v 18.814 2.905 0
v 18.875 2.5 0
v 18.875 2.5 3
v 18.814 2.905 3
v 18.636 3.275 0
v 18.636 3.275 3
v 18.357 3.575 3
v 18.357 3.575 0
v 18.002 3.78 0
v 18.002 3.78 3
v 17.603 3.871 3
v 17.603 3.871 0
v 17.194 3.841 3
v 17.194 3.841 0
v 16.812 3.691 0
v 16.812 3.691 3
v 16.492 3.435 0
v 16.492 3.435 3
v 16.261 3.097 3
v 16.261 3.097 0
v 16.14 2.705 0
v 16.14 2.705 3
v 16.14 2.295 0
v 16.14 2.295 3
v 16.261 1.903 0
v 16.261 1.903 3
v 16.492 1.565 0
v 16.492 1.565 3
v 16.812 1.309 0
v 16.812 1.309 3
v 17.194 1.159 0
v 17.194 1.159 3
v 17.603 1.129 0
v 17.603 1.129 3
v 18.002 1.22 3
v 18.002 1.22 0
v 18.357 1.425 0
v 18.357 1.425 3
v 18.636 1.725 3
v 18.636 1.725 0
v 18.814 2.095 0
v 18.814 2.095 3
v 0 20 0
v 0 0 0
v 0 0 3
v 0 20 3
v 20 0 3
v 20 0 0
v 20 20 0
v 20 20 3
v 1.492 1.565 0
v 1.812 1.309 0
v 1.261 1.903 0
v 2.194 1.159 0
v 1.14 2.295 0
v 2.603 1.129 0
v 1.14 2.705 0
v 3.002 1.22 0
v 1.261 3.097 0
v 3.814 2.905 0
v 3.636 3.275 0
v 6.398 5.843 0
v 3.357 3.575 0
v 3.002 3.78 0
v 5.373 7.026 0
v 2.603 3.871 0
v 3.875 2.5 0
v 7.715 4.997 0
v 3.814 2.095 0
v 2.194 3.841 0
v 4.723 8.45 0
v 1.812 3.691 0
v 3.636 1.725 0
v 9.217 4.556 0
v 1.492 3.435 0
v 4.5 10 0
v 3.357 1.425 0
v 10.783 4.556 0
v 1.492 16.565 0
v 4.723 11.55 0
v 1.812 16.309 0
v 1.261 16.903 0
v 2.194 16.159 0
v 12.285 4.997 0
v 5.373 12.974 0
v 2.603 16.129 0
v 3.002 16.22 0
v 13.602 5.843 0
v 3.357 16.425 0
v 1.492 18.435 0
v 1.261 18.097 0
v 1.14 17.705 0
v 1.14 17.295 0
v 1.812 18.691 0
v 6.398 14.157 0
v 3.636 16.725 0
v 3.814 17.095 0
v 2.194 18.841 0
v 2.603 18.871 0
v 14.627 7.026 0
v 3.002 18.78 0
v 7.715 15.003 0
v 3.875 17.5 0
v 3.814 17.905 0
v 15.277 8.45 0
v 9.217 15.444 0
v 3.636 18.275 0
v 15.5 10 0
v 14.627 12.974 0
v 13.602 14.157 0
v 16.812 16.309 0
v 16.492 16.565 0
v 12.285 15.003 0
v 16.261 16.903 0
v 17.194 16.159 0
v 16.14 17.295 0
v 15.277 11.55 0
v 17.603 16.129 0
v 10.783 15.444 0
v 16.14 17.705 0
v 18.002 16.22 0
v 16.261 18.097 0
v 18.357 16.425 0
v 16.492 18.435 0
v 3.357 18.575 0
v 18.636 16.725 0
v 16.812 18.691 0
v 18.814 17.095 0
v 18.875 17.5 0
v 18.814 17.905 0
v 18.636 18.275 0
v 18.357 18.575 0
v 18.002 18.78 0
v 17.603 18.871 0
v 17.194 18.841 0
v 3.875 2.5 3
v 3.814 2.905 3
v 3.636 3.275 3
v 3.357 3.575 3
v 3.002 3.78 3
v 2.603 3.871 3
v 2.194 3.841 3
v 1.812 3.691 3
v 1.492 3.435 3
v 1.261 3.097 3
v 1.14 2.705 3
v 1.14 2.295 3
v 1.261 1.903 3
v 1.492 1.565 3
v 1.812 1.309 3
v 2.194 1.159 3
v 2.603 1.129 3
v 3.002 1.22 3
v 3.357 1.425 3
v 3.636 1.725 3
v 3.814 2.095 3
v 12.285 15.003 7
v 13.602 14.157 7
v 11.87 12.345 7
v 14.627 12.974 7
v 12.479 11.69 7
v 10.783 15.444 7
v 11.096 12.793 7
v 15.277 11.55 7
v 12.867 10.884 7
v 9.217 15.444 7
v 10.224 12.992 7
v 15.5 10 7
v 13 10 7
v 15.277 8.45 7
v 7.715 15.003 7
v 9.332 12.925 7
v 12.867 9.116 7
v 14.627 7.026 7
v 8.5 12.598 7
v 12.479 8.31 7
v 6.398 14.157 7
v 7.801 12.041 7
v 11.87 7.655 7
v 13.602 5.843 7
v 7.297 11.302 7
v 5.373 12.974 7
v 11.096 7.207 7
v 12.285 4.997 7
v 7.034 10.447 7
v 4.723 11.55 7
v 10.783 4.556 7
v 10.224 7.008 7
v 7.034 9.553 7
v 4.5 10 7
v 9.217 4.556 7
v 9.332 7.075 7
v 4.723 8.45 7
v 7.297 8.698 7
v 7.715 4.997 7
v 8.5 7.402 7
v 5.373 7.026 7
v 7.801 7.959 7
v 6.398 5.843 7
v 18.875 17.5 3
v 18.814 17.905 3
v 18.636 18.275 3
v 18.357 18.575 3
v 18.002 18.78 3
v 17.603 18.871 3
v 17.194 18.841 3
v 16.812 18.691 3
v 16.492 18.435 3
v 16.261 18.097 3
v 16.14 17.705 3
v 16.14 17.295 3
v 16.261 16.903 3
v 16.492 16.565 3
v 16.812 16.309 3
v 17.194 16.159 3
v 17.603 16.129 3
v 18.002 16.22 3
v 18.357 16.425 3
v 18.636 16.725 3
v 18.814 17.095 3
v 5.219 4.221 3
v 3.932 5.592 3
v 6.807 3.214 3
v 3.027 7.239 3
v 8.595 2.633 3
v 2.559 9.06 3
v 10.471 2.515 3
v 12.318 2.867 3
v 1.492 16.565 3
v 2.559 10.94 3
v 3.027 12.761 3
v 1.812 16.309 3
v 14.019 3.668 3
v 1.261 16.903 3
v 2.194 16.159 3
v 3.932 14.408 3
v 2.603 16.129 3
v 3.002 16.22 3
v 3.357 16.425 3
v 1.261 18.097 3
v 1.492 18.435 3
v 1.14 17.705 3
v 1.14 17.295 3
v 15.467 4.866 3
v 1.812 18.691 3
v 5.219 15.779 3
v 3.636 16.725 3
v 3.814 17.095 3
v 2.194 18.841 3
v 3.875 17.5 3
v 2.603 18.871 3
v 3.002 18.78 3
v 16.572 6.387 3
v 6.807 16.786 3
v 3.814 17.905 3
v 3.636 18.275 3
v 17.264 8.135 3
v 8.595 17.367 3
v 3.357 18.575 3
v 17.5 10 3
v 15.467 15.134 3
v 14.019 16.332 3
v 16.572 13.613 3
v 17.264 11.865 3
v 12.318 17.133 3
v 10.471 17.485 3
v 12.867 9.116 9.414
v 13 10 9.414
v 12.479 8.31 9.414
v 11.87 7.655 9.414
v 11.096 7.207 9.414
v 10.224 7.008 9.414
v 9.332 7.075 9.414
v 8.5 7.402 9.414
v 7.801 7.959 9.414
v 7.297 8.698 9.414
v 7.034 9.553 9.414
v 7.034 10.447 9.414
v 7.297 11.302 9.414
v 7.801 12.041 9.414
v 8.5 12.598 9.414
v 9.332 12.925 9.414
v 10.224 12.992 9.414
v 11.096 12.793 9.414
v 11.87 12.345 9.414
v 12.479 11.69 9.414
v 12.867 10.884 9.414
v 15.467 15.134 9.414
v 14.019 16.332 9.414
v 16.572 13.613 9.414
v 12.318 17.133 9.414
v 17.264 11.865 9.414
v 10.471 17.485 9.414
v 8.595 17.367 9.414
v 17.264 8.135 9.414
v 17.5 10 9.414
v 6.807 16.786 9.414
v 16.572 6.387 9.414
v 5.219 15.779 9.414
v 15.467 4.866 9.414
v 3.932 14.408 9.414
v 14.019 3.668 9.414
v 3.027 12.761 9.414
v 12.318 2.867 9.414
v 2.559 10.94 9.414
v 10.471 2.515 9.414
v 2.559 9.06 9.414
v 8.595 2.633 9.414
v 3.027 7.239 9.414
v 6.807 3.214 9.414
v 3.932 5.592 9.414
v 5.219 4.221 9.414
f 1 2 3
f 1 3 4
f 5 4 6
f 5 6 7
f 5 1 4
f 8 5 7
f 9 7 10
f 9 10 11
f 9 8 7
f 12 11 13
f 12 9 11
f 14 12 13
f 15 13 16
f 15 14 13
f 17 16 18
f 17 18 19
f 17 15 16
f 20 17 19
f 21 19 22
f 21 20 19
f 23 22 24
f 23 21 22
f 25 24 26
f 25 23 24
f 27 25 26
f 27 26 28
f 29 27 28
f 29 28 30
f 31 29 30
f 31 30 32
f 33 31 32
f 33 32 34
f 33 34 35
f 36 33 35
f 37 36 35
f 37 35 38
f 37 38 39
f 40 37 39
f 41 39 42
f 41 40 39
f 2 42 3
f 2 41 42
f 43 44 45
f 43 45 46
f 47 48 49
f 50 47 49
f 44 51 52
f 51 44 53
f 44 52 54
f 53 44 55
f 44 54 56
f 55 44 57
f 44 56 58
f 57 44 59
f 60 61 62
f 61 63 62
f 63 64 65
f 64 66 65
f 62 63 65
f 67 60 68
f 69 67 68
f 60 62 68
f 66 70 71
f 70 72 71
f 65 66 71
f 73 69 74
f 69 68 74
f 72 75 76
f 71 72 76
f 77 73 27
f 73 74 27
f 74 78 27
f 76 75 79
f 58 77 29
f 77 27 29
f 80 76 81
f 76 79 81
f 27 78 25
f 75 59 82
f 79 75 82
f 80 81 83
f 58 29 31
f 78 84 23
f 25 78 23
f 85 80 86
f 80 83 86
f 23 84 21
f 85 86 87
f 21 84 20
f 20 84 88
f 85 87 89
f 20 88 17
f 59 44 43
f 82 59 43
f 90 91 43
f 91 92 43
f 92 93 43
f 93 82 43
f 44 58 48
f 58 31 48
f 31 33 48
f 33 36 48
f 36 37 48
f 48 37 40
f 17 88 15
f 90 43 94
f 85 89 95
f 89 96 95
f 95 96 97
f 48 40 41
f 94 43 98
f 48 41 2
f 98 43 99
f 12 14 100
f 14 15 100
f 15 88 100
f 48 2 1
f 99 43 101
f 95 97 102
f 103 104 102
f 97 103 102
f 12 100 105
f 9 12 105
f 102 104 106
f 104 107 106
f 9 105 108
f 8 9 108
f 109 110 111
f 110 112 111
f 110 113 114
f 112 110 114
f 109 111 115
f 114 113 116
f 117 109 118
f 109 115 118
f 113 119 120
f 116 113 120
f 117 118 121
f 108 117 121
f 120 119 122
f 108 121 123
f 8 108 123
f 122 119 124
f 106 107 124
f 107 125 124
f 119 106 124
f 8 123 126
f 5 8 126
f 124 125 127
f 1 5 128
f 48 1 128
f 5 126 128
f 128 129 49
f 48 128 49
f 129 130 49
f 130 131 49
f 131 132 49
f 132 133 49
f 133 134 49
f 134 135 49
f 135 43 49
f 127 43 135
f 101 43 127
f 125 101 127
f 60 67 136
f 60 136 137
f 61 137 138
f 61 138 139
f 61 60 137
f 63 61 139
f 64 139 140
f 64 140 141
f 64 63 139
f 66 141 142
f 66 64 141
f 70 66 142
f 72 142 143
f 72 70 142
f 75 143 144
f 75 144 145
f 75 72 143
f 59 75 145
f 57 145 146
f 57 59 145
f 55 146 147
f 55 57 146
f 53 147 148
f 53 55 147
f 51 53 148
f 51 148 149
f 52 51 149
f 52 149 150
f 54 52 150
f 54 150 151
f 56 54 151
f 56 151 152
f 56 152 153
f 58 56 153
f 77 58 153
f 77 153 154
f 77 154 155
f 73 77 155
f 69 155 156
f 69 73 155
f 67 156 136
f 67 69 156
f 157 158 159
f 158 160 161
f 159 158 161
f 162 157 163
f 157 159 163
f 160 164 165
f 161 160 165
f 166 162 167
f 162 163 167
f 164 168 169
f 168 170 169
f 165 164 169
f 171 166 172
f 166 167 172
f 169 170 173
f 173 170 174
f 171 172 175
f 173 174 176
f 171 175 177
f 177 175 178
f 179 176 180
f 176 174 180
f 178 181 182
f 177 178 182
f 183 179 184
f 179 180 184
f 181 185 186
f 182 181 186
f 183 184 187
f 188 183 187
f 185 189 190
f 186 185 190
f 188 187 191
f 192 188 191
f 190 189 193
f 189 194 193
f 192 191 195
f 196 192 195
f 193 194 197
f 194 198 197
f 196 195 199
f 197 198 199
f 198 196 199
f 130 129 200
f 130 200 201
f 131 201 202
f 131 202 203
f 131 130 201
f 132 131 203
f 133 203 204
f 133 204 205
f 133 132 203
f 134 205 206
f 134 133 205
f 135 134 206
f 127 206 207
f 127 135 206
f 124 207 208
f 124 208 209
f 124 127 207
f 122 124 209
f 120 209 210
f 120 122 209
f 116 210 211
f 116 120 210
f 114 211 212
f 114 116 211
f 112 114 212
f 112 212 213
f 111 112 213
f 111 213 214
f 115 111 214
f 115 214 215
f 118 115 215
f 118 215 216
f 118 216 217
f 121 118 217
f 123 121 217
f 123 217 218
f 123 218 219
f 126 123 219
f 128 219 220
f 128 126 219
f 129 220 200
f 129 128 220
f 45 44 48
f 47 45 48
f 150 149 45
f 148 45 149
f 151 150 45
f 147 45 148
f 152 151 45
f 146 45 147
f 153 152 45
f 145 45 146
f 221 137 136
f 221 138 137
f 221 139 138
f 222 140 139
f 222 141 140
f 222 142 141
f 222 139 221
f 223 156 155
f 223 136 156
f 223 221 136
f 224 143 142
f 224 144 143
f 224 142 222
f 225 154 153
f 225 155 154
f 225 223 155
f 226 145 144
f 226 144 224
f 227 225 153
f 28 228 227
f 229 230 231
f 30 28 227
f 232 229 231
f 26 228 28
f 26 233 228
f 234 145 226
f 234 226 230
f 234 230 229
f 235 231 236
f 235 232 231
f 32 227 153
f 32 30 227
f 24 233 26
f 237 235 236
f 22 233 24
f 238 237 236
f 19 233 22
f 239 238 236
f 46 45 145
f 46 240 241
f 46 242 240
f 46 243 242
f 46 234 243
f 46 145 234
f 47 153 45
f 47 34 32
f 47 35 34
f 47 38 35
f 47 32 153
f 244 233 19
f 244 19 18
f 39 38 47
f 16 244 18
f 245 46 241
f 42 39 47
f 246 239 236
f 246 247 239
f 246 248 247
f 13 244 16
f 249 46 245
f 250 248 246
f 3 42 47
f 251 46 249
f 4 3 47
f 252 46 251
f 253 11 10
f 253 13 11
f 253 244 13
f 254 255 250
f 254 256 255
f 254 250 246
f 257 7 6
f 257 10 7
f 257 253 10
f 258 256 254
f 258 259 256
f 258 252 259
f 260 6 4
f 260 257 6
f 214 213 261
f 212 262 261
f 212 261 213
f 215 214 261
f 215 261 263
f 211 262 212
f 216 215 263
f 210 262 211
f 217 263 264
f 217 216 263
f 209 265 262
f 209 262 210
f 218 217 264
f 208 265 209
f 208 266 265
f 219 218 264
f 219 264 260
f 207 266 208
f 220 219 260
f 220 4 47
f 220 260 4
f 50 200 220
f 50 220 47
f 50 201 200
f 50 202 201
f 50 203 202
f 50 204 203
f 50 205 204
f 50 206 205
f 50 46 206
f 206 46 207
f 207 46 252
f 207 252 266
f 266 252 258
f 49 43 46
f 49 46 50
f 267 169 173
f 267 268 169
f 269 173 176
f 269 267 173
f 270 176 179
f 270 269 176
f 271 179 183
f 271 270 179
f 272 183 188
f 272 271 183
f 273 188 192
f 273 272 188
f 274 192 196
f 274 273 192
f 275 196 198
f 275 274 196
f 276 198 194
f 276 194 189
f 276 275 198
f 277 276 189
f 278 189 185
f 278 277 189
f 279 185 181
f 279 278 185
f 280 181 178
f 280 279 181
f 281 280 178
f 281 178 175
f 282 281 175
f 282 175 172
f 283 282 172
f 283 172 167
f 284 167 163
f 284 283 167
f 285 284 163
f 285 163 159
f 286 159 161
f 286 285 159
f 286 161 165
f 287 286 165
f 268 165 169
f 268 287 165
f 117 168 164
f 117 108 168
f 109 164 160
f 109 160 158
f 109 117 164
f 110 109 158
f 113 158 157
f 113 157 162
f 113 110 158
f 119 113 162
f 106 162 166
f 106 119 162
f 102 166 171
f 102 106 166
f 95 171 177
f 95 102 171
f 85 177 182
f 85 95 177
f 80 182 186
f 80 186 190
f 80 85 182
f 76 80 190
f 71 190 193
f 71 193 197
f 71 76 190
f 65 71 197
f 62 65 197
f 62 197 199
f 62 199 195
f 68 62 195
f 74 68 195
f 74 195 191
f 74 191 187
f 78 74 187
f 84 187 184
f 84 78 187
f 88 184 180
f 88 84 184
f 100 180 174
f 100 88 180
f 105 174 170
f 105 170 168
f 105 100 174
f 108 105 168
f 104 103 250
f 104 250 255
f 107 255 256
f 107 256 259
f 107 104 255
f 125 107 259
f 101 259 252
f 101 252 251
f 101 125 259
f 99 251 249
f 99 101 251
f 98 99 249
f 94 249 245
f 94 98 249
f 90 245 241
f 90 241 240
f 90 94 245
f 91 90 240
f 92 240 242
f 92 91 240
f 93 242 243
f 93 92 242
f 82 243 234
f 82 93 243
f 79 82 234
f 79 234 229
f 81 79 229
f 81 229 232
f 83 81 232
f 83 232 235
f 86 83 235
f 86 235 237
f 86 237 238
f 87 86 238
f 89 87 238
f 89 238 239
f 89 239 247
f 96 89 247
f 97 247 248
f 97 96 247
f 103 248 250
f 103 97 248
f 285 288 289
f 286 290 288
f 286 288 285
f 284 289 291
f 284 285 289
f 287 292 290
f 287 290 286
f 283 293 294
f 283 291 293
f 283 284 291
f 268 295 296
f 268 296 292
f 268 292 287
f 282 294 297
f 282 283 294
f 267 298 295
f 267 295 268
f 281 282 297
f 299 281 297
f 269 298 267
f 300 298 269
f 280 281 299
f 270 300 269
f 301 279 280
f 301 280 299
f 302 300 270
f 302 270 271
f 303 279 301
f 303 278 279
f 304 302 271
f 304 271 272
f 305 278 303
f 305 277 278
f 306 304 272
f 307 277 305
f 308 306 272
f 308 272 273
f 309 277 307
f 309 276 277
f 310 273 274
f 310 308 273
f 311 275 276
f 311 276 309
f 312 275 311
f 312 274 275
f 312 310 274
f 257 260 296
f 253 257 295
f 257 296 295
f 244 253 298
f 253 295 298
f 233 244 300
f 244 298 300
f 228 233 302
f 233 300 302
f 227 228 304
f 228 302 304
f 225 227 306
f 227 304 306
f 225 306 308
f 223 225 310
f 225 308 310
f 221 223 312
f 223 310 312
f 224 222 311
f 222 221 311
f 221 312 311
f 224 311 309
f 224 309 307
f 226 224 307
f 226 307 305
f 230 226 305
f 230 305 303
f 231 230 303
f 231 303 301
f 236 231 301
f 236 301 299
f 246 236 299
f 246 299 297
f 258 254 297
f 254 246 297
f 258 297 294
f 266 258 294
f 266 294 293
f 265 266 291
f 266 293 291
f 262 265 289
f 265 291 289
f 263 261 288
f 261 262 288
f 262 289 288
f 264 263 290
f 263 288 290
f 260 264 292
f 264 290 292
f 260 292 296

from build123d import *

# Parameters (mm, degrees)
F0_W     = 20
F0_H     = 20
F0_R     = 1.375
F0_R_2   = 5.5
F1_DEPTH = 3
F2_R     = 7.5
F2_R_2   = 5.5
F3_DEPTH = 4
F5_W     = 4.5
F5_H     = 2.413743116


with BuildPart() as f1:
    # F0 (on Top) → F1 (new body)
    with BuildSketch(Plane.XY):
        with Locations((10, 10)):
            Rectangle(F0_W, F0_H)
        with Locations((2.5, 2.5)):
            Circle(F0_R, mode=Mode.SUBTRACT)
        with Locations((17.5, 2.5)):
            Circle(F0_R, mode=Mode.SUBTRACT)
        with Locations((2.5, 17.5)):
            Circle(F0_R, mode=Mode.SUBTRACT)
        with Locations((10, 10)):
            Circle(F0_R_2, mode=Mode.SUBTRACT)
        with Locations((17.5, 17.5)):
            Circle(F0_R, mode=Mode.SUBTRACT)
    extrude(amount=F1_DEPTH)

    # F2 (on face) → F3 (join)
    with BuildSketch(Plane.XY.offset(3)):
        with Locations((10, 10)):
            Circle(F2_R)
        with Locations((10, 10)):
            Circle(F2_R_2, mode=Mode.SUBTRACT)
    extrude(amount=F3_DEPTH)

    # F5 (on offset) → F6 (revolve)
    with BuildSketch(Plane.XZ.offset(-10)):
        with Locations((15.25, 8.206871558)):
            Rectangle(F5_W, F5_H)
    revolve(axis=Axis((10, 10, 3.5), (0, 0, -1)))


solid = f1.part
